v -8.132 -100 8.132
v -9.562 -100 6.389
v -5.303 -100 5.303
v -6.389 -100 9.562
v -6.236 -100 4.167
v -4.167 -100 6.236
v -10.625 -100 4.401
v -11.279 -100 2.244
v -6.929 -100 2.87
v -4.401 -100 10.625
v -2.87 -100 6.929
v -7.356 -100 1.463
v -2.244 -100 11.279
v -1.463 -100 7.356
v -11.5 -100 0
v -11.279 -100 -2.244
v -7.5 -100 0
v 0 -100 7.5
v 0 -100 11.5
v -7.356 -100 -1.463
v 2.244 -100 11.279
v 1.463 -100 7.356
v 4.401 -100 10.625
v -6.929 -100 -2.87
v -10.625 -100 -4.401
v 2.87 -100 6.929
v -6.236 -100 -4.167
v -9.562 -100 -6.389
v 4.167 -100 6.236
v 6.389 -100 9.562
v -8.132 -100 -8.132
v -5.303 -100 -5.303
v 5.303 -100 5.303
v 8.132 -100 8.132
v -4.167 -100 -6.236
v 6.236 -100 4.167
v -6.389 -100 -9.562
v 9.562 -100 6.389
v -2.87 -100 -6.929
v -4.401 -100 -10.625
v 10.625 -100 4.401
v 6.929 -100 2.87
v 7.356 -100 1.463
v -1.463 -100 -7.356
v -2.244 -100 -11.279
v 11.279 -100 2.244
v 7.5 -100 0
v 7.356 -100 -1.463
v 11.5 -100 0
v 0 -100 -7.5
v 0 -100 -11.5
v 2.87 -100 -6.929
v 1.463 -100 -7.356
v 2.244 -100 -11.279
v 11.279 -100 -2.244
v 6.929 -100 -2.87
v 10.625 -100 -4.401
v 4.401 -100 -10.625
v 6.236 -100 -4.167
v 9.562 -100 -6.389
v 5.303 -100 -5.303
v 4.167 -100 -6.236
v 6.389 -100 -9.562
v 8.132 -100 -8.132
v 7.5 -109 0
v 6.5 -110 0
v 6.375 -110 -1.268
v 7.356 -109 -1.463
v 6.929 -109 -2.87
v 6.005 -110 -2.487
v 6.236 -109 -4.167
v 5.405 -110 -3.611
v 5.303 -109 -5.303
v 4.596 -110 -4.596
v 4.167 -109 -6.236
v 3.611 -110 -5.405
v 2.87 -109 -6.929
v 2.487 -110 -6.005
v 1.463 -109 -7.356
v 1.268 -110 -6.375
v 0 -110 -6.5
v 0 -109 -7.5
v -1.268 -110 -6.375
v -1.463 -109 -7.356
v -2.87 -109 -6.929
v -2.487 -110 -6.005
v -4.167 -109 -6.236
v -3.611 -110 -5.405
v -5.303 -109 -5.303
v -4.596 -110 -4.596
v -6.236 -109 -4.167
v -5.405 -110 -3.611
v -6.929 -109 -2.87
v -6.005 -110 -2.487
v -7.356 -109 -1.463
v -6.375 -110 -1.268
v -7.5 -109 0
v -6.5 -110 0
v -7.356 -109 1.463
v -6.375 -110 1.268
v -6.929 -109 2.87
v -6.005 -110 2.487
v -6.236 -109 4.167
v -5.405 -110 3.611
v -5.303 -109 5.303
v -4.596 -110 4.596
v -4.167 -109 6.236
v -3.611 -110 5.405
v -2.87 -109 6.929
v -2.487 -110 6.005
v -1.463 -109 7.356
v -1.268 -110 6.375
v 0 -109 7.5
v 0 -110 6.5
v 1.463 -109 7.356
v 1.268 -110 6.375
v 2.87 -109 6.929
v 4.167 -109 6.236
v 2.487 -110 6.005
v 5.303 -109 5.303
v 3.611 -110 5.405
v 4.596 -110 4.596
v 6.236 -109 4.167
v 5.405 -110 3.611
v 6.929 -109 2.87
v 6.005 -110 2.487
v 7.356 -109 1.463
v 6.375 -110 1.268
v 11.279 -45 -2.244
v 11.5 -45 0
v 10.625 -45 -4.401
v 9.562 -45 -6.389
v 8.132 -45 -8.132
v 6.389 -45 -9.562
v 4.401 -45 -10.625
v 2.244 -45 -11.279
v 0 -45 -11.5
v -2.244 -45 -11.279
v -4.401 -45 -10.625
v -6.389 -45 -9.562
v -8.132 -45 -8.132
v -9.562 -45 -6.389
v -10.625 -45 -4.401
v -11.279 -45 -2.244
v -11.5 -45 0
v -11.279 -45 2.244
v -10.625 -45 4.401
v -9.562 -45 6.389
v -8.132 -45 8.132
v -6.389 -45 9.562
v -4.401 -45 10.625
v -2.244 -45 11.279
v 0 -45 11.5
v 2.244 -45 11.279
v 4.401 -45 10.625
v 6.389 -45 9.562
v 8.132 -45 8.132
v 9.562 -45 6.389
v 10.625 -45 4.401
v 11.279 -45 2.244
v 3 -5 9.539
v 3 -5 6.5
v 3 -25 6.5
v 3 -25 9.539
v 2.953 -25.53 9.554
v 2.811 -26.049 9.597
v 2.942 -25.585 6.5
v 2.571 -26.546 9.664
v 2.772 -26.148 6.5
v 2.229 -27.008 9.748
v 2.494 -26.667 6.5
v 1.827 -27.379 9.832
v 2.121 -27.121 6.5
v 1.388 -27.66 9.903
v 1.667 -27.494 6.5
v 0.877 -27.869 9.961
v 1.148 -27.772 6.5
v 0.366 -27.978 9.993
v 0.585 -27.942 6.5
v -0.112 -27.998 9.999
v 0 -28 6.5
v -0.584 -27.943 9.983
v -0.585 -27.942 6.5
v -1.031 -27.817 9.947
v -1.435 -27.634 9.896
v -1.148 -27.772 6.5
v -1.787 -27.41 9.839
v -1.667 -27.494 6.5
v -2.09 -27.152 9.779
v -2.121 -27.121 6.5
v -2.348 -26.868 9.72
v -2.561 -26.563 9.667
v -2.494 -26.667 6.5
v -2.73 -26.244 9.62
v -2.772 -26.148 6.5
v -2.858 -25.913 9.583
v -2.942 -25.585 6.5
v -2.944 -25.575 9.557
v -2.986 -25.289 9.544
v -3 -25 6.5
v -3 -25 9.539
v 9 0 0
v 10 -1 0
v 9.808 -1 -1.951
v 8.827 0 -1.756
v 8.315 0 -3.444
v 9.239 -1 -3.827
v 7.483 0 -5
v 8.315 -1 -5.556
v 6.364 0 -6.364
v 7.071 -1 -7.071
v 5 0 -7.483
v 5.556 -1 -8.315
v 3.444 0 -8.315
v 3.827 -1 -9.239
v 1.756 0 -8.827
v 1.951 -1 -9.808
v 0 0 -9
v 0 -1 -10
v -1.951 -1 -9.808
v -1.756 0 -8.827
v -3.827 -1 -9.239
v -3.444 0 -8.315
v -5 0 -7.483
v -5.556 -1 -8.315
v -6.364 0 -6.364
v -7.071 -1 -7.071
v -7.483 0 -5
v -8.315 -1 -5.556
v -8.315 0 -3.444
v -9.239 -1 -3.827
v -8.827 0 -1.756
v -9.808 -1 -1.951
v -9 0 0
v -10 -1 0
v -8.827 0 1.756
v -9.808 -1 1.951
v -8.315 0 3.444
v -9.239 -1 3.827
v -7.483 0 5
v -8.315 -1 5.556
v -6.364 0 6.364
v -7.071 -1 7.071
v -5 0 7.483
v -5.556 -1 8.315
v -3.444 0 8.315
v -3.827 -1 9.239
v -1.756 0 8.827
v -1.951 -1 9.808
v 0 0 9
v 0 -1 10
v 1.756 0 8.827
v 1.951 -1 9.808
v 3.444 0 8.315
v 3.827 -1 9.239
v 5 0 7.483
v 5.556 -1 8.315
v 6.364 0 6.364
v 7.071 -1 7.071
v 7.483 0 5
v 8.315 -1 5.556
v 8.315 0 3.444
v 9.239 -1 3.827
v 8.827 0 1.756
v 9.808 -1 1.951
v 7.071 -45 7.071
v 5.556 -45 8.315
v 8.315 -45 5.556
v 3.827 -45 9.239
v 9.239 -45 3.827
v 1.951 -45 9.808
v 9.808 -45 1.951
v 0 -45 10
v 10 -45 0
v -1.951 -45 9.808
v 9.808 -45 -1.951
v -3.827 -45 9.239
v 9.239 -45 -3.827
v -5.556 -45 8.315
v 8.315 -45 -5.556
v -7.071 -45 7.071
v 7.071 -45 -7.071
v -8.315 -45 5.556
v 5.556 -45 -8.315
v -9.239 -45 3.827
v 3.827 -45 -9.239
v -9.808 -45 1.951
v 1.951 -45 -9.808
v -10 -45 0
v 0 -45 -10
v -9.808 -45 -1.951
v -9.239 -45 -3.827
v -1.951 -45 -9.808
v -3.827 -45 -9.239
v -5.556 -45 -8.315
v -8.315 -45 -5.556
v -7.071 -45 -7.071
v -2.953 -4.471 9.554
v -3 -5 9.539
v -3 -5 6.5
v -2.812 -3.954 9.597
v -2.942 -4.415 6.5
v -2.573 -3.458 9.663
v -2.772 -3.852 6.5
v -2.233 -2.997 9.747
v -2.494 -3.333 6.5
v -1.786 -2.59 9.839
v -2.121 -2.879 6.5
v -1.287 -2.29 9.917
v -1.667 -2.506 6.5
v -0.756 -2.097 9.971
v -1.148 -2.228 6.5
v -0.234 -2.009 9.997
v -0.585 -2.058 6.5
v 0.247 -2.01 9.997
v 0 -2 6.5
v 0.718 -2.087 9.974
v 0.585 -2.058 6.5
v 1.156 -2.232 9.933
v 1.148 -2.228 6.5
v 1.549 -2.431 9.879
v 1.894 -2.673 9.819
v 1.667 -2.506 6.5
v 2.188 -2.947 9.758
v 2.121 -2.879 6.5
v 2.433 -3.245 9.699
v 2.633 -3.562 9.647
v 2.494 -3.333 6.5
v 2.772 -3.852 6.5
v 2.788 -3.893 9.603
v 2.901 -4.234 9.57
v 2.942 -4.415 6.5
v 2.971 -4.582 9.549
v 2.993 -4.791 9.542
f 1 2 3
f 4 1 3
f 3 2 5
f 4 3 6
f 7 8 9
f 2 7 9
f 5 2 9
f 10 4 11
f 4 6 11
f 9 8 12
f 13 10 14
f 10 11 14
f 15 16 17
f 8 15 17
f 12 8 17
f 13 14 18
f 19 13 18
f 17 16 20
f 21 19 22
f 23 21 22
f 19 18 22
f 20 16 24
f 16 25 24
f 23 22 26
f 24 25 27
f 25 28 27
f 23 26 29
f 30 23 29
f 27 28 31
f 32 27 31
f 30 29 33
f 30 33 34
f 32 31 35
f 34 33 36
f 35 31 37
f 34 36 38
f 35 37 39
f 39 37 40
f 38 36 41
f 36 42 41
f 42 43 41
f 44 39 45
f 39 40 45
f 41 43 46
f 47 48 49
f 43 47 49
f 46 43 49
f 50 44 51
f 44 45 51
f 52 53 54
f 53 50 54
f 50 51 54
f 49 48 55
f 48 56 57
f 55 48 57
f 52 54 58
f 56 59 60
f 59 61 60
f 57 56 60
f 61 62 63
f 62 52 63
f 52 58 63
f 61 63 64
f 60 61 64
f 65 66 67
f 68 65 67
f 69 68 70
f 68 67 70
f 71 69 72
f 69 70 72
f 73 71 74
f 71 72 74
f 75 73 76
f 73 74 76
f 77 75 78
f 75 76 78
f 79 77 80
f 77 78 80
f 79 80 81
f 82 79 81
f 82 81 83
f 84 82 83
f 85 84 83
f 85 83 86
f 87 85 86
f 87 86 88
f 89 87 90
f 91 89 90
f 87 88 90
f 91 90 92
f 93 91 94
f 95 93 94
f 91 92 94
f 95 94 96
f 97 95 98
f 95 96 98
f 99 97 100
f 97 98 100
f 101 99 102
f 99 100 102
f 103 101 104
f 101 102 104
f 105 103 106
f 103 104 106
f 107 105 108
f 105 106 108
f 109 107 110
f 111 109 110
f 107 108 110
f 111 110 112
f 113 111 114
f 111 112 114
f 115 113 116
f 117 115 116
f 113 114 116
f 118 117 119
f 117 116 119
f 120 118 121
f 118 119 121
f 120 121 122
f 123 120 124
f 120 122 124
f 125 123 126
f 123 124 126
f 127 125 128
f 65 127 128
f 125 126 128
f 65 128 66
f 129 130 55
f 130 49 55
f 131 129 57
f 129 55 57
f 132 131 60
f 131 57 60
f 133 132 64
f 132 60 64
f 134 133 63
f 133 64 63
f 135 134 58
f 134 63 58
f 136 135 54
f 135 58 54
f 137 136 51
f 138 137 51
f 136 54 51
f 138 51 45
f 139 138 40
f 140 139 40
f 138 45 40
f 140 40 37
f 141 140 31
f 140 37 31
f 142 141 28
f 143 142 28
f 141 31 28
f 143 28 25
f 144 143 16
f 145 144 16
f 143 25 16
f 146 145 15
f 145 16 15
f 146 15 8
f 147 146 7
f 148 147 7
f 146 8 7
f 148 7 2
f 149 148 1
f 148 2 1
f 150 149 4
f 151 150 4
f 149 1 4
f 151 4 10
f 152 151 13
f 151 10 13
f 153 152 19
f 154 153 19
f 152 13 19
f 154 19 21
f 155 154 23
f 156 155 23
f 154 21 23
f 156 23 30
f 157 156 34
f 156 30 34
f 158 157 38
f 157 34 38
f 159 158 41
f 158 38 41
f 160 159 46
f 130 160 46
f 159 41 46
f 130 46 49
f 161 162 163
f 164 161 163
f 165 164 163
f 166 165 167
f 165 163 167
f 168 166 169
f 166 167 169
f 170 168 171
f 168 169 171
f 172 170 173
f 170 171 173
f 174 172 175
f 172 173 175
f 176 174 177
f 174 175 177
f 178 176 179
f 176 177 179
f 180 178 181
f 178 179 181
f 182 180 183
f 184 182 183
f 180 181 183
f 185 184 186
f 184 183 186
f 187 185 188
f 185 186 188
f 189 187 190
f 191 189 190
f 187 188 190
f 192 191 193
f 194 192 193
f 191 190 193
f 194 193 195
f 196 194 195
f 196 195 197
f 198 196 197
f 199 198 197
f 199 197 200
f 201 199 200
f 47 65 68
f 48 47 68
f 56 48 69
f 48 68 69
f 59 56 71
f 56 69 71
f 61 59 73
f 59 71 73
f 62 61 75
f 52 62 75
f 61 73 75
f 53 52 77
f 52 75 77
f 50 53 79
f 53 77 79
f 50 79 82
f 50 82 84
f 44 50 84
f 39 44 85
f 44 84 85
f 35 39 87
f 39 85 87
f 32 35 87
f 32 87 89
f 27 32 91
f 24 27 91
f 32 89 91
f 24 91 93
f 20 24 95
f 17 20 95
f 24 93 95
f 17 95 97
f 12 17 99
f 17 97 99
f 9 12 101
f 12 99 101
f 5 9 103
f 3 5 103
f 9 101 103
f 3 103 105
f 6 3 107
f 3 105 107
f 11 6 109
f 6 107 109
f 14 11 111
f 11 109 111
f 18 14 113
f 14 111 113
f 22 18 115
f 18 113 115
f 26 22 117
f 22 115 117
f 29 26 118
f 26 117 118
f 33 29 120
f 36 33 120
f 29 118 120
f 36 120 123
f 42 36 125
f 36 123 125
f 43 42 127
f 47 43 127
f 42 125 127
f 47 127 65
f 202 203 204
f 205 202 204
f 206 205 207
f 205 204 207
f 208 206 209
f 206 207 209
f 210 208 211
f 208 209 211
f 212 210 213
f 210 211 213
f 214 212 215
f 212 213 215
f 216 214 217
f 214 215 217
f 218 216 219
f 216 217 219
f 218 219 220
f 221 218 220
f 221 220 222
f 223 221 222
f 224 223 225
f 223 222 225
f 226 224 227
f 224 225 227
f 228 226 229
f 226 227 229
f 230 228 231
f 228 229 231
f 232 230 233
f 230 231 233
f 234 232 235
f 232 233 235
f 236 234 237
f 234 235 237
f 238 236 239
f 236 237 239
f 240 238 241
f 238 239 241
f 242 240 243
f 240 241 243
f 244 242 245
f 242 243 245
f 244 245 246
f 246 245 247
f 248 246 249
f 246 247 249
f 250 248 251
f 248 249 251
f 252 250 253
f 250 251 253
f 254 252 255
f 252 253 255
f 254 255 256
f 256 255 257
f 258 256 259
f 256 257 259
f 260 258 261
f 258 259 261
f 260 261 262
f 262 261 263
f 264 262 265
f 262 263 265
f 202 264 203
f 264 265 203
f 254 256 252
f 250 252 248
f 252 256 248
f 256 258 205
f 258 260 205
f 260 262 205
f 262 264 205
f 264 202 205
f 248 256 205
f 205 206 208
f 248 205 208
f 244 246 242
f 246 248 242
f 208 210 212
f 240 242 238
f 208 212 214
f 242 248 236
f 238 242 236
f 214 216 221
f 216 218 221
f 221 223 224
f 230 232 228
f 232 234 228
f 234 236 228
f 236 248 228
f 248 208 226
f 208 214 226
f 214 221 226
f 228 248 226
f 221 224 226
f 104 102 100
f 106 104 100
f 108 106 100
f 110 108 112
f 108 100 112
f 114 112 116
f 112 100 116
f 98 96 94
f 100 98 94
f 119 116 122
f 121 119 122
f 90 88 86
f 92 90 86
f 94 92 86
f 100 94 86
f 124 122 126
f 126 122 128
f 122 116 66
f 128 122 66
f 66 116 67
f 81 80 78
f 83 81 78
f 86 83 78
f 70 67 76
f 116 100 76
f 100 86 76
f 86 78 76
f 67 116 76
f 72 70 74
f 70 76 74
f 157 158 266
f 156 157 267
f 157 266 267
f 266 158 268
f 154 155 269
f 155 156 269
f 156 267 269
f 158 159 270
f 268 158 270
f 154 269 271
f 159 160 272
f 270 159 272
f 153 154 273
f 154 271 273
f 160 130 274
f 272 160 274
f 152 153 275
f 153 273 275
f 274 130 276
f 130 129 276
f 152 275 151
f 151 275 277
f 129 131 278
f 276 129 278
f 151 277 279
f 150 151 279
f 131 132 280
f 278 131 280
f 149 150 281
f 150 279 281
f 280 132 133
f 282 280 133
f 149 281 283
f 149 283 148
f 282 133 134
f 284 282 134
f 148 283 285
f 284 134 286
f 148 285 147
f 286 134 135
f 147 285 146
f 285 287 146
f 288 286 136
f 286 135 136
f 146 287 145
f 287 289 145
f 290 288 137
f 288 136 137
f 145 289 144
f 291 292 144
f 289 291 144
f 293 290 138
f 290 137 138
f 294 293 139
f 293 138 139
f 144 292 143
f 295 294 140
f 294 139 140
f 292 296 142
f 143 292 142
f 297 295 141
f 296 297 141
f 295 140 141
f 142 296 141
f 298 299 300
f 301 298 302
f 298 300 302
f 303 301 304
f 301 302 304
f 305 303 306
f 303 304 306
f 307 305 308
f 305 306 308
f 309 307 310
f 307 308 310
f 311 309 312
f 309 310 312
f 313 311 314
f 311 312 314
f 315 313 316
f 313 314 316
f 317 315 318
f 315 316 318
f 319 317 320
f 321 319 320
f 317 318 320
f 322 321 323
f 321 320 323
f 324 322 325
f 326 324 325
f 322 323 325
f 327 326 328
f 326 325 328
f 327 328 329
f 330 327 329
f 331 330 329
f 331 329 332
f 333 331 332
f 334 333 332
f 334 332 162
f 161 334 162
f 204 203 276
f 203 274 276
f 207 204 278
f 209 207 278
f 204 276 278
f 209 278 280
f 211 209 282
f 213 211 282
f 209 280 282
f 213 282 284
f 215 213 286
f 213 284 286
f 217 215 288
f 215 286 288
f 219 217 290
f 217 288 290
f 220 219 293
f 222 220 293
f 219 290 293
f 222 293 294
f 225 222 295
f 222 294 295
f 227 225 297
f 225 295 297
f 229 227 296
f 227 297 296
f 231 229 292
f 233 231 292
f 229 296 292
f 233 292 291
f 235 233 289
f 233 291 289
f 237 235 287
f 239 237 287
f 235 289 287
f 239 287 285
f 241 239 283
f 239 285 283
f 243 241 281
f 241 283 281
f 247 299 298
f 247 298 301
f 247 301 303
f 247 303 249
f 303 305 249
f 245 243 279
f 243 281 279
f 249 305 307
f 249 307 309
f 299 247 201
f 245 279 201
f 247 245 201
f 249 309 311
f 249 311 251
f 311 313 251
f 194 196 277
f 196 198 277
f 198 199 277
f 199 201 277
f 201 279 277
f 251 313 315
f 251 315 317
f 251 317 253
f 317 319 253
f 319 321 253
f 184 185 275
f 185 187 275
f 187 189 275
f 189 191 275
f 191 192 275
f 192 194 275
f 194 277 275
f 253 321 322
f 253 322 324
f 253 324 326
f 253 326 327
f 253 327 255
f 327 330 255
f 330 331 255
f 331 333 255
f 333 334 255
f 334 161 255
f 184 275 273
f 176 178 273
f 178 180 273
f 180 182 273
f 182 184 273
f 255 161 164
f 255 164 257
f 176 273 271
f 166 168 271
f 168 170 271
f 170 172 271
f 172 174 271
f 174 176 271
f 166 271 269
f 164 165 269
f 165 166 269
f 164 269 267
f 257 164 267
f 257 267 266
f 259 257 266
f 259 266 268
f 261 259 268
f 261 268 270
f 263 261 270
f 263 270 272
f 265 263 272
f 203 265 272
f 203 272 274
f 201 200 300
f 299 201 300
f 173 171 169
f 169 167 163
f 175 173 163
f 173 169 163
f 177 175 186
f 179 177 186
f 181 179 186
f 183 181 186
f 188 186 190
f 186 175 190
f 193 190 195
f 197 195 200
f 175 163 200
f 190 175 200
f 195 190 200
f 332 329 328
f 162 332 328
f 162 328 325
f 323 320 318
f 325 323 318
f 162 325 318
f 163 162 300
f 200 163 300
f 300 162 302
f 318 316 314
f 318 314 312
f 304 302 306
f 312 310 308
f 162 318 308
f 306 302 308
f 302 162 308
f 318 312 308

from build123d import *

# Parameters (mm, degrees)
CHAMFER_1_SIZE      = 1
CUT_EXTRUDE_1_DEPTH = 6
CHAMFER_2_SIZE      = 1


with BuildPart() as part:
    # 草图1 → 旋转1 (revolve)
    with BuildSketch(Plane.XY):
        Polygon((0, 0), (10, 0), (10, -45), (11.5, -45), (11.5, -100), (7.5, -100), (7.5, -110), (0, -110), align=None)
    revolve(axis=Axis((0, -110, 0), (0, 1, 0)))

    # 倒角1
    chamfer_1_edges = [part.edges().sort_by_distance(p)[0] for p in [
        (-10, 0, 0),
    ]]
    chamfer(chamfer_1_edges, length=CHAMFER_1_SIZE)

    # 草图2 → 切除-拉伸1 (cut, through all)
    with BuildSketch(Plane.XY.offset(6.5)):
        with BuildLine():
            Line((3, -5), (3, -25))
            ThreePointArc((3, -25), (0, -28), (-3, -25))
            Line((-3, -25), (-3, -5))
            ThreePointArc((-3, -5), (0, -2), (3, -5))
        make_face()
    extrude(amount=CUT_EXTRUDE_1_DEPTH, mode=Mode.SUBTRACT)

    # 倒角2
    chamfer_2_edges = [part.edges().sort_by_distance(p)[0] for p in [
        (-7.5, -110, 0),
    ]]
    chamfer(chamfer_2_edges, length=CHAMFER_2_SIZE)


solid = part.part
